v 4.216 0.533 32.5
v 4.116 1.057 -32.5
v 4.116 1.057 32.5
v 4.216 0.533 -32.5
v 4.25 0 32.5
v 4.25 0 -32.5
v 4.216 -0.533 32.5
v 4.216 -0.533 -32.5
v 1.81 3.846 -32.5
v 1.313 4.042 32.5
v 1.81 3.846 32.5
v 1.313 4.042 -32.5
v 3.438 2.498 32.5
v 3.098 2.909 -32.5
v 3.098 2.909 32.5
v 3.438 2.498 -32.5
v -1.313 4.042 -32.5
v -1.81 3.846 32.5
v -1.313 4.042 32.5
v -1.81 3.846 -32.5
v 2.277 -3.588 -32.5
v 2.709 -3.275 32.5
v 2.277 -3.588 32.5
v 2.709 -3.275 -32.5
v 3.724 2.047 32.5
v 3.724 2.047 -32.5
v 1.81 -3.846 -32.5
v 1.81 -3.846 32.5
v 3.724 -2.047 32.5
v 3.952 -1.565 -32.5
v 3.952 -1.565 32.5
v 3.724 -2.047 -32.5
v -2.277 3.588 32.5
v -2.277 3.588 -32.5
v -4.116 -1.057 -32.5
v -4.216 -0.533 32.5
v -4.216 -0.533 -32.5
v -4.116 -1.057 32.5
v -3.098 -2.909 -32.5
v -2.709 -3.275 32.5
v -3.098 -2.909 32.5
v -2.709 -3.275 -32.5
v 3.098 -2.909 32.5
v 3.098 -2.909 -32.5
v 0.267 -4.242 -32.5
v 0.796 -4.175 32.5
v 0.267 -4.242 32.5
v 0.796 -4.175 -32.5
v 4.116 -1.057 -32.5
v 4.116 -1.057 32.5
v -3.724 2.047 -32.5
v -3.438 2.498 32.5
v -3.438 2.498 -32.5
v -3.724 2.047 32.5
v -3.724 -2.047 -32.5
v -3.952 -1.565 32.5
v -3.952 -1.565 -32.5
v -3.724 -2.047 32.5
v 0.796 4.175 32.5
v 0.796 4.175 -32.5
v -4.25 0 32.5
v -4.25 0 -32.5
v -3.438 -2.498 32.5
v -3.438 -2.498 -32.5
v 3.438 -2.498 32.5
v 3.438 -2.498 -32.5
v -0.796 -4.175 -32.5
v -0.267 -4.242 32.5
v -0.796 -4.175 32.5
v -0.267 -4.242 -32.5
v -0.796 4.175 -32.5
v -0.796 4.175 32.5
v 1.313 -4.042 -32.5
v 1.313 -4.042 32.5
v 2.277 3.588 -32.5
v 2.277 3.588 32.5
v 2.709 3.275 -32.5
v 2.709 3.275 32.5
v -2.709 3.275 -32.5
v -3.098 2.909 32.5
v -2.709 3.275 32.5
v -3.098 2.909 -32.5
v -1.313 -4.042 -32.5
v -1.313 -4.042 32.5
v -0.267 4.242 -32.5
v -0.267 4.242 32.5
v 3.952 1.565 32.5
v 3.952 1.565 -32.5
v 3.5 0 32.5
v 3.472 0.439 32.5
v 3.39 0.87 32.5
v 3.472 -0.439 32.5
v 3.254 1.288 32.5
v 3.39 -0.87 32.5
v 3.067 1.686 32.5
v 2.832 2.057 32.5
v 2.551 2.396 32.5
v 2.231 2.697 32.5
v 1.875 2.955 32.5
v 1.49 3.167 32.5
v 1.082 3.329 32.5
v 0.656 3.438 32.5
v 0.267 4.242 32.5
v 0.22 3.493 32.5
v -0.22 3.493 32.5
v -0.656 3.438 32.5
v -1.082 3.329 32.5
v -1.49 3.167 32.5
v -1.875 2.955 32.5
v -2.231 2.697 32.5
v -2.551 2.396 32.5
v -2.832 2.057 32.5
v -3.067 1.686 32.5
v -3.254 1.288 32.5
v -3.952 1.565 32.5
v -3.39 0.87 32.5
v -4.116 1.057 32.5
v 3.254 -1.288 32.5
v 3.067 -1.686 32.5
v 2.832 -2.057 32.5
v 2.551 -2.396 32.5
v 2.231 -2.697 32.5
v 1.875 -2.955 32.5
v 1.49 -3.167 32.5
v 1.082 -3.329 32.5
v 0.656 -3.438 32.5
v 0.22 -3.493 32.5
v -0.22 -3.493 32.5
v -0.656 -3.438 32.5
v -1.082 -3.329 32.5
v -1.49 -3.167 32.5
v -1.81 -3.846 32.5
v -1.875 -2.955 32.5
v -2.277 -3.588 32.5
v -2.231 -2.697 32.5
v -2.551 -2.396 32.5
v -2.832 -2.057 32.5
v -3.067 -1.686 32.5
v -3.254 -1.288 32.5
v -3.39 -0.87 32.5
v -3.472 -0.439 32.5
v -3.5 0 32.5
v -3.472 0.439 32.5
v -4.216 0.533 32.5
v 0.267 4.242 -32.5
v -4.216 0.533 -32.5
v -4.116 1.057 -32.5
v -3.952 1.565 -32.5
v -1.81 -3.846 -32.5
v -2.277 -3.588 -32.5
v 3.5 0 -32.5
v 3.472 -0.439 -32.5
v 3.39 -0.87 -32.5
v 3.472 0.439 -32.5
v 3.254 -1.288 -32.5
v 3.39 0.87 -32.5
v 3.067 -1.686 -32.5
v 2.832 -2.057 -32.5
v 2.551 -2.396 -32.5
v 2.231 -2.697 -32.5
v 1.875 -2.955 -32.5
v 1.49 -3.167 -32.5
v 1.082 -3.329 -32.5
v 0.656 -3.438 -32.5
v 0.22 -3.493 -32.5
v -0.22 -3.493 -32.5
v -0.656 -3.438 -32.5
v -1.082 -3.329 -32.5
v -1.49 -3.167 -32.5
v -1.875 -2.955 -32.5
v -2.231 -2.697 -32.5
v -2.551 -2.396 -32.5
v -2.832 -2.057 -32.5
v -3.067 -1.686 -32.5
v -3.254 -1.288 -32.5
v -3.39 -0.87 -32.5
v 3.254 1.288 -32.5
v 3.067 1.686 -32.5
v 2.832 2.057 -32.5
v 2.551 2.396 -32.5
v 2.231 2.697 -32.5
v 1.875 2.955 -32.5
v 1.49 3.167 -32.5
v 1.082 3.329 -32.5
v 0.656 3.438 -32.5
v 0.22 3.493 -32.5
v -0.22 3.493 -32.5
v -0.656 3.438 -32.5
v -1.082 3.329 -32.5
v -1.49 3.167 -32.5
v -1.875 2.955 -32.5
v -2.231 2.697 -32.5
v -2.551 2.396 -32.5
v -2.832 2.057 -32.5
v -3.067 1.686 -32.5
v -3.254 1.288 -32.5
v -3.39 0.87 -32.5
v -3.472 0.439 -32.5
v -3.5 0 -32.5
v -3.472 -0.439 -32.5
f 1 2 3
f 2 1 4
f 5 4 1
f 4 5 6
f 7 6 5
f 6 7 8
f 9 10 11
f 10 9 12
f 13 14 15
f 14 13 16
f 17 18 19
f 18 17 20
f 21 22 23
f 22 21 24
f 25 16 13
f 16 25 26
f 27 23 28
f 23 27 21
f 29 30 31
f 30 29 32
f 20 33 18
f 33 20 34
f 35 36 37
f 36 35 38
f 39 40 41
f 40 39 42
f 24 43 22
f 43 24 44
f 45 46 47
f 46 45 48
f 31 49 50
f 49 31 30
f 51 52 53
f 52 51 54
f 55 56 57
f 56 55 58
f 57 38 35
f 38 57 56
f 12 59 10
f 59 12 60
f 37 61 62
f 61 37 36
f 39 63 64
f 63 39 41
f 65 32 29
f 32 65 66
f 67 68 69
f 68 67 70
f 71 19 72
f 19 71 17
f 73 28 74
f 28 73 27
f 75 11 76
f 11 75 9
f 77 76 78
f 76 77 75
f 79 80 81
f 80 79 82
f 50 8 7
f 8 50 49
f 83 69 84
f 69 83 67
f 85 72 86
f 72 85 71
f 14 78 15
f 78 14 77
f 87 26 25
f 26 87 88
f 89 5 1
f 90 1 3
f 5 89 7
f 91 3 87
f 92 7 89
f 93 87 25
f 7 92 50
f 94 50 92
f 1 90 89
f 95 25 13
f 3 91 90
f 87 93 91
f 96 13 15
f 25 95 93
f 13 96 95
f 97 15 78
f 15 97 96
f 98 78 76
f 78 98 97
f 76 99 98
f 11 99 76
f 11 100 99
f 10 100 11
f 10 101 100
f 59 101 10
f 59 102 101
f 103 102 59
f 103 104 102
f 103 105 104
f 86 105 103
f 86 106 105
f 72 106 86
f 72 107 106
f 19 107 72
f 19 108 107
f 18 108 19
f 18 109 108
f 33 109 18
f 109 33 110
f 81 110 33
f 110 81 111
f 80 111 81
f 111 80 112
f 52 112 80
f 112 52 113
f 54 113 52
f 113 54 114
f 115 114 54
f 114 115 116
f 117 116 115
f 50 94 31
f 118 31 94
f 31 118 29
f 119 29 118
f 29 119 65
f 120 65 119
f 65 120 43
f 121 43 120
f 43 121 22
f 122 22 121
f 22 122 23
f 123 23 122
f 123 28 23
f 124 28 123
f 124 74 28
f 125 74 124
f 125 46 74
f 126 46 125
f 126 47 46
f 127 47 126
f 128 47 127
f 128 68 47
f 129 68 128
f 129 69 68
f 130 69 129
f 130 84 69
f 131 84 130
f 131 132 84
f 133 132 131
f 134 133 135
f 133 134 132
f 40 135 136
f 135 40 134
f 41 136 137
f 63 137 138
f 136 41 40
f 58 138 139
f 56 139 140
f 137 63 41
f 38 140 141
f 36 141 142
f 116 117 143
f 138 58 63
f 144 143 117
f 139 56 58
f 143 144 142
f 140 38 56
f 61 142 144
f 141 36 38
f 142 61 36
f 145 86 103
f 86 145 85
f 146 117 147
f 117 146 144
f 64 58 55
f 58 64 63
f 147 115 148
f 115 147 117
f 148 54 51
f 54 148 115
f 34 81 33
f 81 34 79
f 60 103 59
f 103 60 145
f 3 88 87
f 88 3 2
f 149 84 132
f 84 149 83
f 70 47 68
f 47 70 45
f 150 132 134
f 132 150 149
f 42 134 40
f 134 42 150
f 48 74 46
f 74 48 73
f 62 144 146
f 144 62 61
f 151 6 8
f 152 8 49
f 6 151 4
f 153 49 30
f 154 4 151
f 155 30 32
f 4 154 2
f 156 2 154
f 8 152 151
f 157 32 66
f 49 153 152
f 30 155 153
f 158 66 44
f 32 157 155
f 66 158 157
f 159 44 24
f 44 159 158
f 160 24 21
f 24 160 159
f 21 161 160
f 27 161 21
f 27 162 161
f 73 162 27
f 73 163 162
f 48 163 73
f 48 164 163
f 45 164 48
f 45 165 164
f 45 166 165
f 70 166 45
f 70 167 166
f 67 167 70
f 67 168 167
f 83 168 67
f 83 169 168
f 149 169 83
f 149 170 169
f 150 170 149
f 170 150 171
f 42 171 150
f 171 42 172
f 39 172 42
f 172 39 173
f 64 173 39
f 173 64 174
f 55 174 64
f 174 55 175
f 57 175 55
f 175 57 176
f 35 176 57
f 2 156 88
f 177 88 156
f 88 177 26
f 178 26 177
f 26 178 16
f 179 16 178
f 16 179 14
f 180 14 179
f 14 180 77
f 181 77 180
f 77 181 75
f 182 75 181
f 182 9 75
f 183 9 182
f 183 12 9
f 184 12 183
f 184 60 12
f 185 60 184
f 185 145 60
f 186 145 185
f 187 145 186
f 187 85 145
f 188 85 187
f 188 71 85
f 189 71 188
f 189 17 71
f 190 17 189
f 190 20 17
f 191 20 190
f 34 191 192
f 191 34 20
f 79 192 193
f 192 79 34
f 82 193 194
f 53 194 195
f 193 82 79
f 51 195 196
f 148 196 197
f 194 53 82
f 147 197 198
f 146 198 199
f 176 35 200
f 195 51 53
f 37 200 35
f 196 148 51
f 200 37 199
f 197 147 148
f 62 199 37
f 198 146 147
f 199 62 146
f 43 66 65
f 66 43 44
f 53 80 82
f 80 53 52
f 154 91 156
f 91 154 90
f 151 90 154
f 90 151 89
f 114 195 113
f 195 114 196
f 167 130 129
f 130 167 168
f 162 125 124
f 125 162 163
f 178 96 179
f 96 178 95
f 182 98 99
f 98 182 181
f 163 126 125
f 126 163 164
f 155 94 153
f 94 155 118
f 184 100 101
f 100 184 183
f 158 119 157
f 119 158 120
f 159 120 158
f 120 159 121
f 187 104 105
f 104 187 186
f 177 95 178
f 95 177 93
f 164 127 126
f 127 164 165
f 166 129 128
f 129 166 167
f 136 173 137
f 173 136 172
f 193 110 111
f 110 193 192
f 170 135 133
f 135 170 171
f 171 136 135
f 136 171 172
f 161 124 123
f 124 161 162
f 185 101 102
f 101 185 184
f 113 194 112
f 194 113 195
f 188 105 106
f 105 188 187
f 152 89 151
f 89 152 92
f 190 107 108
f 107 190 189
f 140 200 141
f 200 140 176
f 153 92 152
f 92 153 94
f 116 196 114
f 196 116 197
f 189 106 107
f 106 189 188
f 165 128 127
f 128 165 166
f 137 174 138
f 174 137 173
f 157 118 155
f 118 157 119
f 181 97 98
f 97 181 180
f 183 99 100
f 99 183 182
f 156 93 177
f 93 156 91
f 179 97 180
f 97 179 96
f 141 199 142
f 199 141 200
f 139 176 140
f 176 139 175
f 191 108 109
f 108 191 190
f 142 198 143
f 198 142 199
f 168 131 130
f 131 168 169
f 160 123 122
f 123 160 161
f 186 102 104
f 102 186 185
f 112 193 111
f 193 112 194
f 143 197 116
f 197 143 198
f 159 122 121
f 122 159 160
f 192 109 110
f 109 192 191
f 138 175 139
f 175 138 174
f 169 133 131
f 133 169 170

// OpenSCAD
$fn = 50;


difference() {
	union() {
		translate(v = [0, 0, -32.5000000000]) {
			cylinder(h = 65, r = 4.2500000000);
		}
	}
	union() {
		translate(v = [0, 0, -100.0000000000]) {
			cylinder(h = 200, r = 3.5000000000);
		}
	}
}
